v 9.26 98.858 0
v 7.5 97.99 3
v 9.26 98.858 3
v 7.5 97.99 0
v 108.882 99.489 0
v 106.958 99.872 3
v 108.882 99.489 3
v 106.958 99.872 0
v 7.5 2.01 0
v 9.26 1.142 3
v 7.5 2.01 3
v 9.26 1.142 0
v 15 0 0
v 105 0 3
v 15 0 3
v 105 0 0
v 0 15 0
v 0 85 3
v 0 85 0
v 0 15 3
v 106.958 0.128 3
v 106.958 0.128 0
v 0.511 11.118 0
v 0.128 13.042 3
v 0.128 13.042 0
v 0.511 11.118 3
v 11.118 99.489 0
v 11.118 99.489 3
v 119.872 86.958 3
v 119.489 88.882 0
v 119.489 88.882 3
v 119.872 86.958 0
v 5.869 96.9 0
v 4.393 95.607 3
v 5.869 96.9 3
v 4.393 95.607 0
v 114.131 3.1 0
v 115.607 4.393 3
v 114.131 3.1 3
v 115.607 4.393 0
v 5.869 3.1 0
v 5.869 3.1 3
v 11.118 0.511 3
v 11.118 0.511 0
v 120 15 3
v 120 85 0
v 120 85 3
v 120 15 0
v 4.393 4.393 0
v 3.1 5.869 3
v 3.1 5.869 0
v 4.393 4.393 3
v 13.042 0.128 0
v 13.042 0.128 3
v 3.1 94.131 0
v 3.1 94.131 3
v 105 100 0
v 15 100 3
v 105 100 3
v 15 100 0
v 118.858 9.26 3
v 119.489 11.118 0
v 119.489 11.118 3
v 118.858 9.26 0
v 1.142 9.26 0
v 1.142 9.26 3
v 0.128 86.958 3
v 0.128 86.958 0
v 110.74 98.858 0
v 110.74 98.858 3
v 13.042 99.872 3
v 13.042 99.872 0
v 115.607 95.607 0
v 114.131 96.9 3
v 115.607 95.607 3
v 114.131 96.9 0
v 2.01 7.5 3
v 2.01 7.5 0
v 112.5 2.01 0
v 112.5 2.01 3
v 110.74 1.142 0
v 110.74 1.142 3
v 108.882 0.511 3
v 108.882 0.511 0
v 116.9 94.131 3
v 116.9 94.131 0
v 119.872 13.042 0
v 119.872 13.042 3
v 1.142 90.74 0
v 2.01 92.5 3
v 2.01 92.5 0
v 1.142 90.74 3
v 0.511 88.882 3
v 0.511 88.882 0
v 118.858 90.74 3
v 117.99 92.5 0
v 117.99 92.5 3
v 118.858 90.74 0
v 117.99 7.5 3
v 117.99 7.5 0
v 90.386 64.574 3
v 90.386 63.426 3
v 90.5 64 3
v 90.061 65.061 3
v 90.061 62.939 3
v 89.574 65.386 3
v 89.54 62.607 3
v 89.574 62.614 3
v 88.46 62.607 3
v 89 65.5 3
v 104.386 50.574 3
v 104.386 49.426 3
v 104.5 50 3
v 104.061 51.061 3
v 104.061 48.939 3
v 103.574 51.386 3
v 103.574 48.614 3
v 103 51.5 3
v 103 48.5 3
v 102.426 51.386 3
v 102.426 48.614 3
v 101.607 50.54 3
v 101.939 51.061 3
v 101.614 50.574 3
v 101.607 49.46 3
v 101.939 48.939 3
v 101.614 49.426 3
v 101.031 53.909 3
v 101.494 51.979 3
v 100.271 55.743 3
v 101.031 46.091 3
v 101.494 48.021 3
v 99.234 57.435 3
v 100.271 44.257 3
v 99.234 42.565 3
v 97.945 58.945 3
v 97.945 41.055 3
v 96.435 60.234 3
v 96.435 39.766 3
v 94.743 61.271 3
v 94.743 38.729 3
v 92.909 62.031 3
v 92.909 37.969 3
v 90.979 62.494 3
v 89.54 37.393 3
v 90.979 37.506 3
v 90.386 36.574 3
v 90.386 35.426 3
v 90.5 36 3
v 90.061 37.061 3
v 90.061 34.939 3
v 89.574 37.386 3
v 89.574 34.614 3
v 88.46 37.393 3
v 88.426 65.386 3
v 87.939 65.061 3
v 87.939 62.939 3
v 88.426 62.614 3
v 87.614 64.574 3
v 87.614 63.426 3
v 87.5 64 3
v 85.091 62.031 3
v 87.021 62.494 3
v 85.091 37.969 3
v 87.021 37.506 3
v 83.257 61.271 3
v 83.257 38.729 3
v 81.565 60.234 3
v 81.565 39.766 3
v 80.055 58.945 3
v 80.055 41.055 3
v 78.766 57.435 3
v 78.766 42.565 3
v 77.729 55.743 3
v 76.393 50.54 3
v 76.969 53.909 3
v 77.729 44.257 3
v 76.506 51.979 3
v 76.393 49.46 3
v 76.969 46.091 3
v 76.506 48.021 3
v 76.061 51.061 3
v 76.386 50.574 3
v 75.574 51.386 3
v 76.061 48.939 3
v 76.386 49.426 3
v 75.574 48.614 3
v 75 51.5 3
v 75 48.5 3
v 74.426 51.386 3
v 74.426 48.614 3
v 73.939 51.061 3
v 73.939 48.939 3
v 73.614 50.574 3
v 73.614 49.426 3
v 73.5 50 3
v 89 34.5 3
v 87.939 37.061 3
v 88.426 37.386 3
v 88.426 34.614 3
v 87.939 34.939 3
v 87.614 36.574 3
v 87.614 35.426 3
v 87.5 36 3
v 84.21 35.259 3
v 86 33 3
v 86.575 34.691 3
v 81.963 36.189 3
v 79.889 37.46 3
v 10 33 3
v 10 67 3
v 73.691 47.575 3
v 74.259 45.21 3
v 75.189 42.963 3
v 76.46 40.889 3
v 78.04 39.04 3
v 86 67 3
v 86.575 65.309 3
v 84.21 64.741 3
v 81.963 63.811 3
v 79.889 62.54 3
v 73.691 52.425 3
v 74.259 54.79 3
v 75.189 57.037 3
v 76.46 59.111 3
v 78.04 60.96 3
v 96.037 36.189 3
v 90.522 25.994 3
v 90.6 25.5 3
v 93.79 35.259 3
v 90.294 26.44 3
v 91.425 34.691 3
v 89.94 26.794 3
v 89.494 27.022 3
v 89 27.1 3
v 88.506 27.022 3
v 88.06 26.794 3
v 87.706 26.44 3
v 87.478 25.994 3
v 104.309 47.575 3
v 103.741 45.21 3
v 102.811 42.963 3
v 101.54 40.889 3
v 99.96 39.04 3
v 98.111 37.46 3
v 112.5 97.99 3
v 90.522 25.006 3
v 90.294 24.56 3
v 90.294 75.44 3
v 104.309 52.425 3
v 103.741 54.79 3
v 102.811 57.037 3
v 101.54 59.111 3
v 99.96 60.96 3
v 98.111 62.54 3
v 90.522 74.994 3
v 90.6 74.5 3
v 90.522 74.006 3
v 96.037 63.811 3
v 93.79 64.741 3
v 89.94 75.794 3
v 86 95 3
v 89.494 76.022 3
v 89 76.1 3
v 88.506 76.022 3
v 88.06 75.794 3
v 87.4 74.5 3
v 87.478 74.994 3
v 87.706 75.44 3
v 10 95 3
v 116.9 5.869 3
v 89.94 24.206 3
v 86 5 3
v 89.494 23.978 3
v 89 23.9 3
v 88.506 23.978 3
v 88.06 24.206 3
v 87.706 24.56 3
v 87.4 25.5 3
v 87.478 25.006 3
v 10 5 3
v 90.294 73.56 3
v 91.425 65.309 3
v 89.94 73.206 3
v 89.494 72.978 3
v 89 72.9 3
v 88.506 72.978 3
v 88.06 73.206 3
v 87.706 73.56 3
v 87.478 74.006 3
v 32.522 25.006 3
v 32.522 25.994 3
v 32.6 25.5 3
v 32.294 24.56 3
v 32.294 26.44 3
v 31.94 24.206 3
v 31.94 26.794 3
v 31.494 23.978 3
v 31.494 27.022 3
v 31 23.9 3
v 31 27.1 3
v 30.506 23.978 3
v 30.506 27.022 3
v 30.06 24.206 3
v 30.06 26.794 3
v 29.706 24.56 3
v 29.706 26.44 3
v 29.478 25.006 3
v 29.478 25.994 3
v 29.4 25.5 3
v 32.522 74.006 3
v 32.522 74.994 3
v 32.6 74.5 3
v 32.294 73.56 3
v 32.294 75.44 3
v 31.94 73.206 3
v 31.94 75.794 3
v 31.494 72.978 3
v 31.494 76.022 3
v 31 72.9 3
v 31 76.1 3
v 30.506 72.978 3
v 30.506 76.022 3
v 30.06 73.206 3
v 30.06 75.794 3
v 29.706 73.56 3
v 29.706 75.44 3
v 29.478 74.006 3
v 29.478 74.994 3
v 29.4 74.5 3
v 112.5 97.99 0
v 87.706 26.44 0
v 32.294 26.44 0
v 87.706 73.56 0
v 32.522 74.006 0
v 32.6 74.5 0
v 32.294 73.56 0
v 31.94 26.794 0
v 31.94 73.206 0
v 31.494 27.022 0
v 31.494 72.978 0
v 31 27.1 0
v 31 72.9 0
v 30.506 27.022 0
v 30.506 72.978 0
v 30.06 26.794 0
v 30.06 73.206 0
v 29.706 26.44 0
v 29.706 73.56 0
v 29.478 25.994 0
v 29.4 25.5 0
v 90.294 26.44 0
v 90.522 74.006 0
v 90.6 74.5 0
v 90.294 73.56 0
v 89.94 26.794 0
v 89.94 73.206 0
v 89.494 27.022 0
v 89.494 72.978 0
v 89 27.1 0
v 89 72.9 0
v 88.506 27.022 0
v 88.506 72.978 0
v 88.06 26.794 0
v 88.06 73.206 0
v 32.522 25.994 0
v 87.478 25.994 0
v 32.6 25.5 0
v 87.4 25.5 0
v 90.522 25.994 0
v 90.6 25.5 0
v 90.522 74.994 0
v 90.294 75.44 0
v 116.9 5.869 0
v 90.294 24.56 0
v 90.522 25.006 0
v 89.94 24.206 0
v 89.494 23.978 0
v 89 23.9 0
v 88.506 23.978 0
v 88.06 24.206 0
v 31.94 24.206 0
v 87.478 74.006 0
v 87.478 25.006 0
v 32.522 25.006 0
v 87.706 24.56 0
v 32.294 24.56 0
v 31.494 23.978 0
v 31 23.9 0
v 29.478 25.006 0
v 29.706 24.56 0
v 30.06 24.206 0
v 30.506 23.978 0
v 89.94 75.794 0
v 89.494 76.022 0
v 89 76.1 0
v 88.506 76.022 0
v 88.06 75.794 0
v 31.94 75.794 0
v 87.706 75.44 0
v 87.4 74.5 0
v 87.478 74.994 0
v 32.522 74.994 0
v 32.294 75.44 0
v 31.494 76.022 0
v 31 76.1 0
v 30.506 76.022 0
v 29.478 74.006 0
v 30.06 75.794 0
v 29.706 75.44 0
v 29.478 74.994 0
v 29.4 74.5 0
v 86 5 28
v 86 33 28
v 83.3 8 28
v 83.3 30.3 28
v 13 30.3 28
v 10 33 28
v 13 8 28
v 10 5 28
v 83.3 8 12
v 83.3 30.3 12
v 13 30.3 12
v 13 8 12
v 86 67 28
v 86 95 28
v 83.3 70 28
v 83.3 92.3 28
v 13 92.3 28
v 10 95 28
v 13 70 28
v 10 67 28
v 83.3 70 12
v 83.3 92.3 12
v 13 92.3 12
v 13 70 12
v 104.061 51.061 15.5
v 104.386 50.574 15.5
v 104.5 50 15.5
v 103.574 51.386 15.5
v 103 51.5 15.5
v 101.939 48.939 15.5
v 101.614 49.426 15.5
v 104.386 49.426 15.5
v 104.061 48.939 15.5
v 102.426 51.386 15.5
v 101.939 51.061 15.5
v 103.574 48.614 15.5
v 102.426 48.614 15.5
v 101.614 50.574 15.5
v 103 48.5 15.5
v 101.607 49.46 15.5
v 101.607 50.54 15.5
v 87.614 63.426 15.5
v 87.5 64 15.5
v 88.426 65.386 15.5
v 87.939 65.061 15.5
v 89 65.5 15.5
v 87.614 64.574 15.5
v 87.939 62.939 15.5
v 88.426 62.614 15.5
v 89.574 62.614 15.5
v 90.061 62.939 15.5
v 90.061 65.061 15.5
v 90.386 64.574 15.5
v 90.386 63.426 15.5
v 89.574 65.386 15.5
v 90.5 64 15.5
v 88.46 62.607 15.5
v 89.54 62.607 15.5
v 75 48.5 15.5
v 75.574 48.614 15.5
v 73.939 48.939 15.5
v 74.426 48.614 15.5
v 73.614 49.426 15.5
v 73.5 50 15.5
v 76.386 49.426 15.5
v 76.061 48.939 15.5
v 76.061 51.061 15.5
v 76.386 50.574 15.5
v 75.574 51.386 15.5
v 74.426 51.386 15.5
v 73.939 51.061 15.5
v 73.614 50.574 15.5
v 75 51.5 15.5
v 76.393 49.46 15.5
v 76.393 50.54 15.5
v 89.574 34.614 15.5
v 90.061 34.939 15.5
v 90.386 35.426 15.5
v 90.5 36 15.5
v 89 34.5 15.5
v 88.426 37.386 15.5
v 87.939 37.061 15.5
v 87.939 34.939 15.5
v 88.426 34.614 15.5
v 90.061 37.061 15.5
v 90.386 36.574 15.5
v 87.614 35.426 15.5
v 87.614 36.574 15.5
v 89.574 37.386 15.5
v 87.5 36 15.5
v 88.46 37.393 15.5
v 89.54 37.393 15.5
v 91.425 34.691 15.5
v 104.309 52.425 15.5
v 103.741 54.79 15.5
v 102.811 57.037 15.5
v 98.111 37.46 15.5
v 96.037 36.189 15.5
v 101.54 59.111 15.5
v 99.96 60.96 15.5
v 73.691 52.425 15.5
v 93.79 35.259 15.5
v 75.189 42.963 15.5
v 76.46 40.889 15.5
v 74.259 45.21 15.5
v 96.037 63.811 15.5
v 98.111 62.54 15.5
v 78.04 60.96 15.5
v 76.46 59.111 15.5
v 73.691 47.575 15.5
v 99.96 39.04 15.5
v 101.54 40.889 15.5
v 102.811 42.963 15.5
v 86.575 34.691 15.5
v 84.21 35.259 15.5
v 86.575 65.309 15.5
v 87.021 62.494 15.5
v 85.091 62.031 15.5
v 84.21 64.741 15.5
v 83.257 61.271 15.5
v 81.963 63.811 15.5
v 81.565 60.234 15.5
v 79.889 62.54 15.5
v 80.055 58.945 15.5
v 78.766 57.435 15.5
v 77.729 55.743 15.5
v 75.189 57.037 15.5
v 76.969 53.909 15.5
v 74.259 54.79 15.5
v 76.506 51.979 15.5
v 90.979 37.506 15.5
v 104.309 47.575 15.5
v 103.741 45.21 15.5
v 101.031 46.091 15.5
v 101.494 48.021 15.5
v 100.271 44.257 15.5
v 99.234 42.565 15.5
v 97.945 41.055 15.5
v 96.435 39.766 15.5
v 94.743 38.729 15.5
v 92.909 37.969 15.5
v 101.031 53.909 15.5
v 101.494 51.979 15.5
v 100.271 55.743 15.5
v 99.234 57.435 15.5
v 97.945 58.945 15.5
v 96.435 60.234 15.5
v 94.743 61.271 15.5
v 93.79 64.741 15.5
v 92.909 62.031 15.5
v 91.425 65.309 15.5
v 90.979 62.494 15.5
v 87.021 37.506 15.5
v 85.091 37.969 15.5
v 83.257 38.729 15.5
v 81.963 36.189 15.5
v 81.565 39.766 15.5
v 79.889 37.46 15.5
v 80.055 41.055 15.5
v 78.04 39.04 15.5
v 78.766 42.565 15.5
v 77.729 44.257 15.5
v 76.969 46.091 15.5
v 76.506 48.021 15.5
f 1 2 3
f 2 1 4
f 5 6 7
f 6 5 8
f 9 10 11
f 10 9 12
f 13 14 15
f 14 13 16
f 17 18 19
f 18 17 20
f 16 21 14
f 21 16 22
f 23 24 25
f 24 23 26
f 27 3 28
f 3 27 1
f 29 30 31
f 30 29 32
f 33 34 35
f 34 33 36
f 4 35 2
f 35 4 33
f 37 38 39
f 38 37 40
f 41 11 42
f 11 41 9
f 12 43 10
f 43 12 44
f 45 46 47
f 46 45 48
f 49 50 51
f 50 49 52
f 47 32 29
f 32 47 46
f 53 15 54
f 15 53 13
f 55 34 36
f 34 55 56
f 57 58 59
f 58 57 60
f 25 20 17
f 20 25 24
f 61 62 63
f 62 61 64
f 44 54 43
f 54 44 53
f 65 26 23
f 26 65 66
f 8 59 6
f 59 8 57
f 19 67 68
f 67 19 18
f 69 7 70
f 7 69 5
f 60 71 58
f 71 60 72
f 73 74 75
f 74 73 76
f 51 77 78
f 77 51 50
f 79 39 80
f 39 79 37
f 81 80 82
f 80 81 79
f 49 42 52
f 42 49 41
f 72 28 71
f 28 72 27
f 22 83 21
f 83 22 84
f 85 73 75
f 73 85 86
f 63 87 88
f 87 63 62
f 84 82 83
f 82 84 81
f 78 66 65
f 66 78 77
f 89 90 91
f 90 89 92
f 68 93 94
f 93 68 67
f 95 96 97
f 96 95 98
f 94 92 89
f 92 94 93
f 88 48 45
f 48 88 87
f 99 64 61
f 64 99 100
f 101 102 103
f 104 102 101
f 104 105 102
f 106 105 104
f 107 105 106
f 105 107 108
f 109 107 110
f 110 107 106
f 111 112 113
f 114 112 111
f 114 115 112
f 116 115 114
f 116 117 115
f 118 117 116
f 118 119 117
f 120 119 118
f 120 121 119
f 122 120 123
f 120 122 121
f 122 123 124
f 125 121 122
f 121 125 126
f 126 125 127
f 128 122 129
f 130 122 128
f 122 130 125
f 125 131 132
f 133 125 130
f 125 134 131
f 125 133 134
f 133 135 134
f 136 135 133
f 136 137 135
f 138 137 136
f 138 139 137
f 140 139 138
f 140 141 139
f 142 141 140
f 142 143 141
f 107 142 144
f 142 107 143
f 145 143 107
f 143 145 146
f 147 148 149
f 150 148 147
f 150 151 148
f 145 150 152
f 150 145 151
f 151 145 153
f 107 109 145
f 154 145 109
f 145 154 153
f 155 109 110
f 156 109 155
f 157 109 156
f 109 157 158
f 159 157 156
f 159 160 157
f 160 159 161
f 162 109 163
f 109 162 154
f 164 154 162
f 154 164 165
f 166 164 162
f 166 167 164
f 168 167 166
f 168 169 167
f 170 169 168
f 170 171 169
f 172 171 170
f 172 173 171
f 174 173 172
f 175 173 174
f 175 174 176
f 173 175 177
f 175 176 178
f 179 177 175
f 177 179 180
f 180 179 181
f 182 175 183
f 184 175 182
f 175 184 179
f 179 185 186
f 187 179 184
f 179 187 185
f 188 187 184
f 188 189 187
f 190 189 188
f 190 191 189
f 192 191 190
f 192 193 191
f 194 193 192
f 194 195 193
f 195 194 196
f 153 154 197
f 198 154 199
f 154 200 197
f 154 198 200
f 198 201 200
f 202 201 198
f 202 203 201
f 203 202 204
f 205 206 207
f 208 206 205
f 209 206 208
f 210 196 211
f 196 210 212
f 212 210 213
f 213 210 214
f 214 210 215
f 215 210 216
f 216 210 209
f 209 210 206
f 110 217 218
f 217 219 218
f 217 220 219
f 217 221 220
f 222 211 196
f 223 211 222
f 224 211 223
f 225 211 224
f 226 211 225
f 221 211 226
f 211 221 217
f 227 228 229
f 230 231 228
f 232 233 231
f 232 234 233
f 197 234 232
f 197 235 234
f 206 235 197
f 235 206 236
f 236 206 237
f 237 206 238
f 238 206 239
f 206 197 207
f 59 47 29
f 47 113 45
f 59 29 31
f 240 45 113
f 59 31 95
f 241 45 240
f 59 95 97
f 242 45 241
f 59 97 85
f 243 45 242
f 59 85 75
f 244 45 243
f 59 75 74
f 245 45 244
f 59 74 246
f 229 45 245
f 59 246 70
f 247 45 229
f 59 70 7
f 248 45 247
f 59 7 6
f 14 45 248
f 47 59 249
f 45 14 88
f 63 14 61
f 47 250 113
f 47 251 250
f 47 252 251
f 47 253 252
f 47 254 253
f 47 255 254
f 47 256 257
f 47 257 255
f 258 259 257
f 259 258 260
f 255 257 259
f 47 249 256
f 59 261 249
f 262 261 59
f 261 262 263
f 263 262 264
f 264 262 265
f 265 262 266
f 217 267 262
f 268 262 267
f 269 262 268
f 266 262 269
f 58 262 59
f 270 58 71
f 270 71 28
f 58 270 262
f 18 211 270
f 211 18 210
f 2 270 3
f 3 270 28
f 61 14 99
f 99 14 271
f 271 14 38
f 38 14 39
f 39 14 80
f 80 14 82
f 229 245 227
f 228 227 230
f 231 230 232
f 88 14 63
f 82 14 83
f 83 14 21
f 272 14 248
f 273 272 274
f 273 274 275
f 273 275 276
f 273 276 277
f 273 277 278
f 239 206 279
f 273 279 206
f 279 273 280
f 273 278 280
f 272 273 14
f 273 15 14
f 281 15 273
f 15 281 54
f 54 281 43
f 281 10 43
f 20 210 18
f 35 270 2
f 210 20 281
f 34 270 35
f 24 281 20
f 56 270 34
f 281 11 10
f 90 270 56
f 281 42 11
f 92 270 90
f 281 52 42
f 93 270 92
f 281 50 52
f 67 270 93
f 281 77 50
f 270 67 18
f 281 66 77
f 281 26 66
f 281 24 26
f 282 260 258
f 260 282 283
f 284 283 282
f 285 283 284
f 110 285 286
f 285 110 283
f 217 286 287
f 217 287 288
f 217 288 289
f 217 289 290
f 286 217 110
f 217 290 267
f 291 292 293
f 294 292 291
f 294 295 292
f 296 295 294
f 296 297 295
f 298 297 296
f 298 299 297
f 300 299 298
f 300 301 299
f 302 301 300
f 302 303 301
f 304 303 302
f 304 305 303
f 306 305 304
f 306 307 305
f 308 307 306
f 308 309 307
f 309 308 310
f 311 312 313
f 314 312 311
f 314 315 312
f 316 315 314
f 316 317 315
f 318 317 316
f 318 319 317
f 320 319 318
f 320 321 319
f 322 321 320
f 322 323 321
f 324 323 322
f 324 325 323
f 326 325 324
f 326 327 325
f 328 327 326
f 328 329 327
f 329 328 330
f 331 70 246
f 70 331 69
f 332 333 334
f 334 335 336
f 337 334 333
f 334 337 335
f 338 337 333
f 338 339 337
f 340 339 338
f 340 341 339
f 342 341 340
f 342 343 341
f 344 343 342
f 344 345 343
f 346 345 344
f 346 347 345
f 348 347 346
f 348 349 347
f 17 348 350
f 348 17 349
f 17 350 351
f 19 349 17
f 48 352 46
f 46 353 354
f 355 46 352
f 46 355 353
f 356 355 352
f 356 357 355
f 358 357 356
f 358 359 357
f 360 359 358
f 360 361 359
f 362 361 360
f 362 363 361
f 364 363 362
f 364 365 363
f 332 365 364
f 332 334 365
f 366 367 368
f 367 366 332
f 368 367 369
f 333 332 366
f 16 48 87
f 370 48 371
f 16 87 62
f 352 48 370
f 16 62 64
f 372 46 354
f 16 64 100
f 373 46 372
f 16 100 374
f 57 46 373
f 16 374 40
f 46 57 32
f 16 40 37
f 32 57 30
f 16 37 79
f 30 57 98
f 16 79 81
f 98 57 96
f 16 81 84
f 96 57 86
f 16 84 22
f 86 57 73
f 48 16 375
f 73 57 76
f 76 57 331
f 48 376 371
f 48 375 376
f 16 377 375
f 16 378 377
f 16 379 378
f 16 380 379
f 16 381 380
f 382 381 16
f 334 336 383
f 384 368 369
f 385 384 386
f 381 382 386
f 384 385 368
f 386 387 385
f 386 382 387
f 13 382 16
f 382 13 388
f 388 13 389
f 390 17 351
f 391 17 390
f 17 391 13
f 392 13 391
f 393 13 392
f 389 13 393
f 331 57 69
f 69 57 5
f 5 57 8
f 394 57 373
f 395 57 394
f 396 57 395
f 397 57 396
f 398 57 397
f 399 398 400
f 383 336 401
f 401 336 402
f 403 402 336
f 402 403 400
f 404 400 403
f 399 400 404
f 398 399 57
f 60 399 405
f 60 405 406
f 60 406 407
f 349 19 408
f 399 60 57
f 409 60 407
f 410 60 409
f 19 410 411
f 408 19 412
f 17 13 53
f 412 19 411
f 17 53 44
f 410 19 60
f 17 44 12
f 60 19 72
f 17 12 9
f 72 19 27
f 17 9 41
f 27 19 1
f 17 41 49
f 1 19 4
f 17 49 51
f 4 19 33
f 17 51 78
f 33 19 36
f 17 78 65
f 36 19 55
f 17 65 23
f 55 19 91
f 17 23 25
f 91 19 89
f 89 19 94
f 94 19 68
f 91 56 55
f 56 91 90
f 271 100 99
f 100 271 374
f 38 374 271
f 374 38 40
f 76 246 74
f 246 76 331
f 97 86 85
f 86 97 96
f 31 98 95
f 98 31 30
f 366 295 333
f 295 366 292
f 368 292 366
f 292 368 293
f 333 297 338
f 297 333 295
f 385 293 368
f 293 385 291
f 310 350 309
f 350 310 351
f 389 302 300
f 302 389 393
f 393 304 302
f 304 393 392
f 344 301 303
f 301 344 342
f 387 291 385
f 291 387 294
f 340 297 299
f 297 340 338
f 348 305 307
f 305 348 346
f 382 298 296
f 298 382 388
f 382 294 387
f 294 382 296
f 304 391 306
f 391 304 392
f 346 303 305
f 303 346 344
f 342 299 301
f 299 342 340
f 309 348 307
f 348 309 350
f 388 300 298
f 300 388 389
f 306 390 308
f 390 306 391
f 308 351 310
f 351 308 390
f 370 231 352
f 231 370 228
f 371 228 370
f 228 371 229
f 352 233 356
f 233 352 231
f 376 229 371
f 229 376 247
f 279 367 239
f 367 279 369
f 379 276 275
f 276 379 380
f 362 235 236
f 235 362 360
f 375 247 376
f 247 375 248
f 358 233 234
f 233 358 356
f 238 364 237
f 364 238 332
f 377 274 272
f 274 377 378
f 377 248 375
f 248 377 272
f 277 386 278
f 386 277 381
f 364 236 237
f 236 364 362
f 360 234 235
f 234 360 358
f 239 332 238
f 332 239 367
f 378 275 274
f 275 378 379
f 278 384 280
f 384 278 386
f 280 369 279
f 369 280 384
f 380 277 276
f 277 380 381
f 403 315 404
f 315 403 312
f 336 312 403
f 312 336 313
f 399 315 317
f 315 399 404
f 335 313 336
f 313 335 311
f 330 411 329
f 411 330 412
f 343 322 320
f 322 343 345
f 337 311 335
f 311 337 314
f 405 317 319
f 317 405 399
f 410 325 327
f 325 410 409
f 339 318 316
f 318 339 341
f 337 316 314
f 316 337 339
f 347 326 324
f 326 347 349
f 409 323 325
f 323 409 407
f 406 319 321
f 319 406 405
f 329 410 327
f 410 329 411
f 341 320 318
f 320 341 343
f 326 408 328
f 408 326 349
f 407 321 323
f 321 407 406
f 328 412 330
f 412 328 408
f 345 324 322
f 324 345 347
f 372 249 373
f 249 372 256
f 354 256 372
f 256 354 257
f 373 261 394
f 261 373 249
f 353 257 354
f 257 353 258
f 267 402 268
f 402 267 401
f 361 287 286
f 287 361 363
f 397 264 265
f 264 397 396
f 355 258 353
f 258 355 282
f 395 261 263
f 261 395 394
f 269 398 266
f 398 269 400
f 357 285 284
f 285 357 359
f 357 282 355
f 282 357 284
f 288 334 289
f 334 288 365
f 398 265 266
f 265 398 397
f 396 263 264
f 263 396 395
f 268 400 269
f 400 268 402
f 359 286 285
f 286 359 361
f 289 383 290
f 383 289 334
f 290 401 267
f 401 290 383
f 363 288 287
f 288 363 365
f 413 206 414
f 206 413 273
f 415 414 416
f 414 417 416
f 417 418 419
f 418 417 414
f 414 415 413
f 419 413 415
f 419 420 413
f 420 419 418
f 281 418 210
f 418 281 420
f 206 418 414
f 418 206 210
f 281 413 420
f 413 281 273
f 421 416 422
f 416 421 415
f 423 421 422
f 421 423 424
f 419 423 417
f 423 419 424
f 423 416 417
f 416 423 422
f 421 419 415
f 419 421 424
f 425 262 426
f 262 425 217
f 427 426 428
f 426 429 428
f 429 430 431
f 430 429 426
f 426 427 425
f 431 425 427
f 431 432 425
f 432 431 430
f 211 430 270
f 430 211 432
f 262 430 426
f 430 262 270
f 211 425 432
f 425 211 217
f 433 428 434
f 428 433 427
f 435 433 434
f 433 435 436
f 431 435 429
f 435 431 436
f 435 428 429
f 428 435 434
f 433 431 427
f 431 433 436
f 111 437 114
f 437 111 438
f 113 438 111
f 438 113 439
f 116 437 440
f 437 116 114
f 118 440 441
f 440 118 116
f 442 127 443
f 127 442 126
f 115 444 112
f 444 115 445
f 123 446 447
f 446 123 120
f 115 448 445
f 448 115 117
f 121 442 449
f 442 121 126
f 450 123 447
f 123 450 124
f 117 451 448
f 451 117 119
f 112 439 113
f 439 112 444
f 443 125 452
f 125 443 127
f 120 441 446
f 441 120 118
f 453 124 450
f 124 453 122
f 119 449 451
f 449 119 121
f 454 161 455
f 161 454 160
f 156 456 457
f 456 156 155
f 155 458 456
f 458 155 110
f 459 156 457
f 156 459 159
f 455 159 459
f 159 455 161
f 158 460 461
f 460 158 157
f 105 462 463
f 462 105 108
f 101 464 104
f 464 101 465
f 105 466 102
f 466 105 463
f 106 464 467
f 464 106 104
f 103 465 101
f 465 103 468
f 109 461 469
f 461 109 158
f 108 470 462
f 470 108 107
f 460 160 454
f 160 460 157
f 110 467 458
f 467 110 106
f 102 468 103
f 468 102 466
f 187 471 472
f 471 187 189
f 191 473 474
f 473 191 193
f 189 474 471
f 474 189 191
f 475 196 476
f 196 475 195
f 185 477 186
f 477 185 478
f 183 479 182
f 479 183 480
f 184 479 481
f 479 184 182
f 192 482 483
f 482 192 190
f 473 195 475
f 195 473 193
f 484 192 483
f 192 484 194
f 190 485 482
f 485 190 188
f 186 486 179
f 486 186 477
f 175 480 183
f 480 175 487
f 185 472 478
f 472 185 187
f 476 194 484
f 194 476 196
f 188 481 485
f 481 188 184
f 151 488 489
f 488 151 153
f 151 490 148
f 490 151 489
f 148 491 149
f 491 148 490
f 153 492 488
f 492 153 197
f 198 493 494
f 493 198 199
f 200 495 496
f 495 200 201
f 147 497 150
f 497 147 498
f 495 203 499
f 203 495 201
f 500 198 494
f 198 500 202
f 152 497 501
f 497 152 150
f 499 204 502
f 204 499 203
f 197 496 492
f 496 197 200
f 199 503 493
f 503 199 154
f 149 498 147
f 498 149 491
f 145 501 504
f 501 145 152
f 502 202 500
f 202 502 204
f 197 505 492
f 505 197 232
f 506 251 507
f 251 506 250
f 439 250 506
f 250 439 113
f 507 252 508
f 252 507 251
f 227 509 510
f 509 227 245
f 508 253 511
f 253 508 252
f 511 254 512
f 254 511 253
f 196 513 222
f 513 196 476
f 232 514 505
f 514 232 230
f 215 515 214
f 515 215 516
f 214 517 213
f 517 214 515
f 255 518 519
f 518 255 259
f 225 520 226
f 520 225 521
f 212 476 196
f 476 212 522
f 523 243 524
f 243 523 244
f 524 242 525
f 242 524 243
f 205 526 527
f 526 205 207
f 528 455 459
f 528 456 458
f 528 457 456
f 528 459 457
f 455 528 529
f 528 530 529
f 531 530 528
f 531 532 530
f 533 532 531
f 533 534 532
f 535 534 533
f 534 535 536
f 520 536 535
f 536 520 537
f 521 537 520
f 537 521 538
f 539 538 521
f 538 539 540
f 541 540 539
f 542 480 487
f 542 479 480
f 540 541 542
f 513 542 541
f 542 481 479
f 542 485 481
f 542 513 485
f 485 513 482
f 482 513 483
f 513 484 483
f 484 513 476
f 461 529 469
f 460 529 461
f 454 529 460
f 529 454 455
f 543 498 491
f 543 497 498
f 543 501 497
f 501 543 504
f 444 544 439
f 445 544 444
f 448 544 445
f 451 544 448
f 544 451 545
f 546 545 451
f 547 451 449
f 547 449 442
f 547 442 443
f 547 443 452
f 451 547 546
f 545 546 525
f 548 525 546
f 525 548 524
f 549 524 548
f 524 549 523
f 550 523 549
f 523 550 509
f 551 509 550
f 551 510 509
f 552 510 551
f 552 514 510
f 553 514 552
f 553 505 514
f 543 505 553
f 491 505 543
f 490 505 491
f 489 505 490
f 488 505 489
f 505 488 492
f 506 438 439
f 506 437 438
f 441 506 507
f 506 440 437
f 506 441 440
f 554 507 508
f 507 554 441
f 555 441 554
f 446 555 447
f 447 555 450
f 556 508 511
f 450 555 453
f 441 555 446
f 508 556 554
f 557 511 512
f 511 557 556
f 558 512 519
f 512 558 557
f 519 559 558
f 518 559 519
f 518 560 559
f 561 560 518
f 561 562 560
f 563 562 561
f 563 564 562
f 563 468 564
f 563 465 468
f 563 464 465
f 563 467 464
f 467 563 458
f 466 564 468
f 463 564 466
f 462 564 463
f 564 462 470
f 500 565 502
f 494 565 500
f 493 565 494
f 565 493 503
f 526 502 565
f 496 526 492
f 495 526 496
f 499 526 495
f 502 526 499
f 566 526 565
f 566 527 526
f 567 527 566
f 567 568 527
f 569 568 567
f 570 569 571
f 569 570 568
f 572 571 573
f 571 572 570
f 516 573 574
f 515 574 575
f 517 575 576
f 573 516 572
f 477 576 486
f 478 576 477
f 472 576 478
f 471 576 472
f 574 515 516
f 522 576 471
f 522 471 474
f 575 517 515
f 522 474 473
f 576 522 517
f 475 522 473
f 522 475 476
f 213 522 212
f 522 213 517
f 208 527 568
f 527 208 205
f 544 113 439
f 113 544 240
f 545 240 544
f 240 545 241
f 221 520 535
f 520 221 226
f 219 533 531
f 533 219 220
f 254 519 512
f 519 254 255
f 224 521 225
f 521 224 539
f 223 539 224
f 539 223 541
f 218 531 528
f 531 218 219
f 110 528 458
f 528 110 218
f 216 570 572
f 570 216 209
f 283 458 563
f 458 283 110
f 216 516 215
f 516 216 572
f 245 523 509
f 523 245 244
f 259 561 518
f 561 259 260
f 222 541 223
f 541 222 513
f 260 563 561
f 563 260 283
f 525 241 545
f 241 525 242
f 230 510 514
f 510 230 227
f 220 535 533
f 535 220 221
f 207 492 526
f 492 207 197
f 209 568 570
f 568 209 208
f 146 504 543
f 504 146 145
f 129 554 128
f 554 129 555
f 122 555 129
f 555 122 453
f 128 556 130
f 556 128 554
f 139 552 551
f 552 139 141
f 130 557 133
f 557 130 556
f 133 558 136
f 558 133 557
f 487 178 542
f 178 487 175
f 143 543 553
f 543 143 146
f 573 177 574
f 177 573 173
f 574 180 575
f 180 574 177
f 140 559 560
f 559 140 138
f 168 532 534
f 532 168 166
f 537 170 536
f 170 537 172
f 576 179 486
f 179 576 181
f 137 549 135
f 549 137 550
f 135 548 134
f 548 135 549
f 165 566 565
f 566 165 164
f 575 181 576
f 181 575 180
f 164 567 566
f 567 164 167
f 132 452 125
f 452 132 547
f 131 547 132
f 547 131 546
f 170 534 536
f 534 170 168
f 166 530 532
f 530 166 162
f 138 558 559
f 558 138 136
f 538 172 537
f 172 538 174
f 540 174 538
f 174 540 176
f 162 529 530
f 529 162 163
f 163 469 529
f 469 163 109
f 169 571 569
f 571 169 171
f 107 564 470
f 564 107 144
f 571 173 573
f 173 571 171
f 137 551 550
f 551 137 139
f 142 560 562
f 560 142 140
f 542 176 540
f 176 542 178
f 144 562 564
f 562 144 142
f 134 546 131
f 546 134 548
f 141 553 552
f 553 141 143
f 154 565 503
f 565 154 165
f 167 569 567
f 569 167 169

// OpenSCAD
// file: params.scad
// =========================================================
// Robot Layla — Paramètres communs à toutes les pièces
// Modifiez ces valeurs selon vos composants réels avant
// d'exporter les STL (mesurez vos moteurs/écran au pied à
// coulisse si possible, les kits varient légèrement).
// =========================================================

// --- Général ---
wall = 3;              // épaisseur de paroi standard (mm)
tolerance = 0.3;       // jeu pour les pièces qui s'emboîtent (mm)

// --- Châssis / base ---
base_length = 120;     // longueur de la base (mm)
base_width  = 100;     // largeur de la base (mm)
base_height = 25;      // hauteur des parois de la base (mm)
corner_radius = 15;    // rayon des coins arrondis de la base

// --- Moteurs (kit "TT motor gearbox" standard) ---
motor_length = 70;     // longueur du moteur + boîte de vitesse (mm)
motor_width  = 22;     // largeur du moteur (mm)
motor_height = 18;     // hauteur du moteur (mm)
motor_shaft_offset = 9; // hauteur de l'axe par rapport au bas du moteur (mm)

// --- Roulette folle ---
caster_diameter = 25;  // diamètre de la roulette (mm)
caster_mount_hole = 3; // diamètre des trous de fixation (mm)

// --- Tête / écran OLED ---
head_diameter = 90;    // diamètre de la tête (mm)
head_height   = 60;    // hauteur de la tête (mm)
oled_width  = 27.3;    // largeur de la carte OLED SSD1306 0.96" (mm)
oled_height = 27.8;    // hauteur de la carte OLED (mm)
oled_screen_width  = 21.7; // zone d'affichage utile (mm)
oled_screen_height = 11.2;
oled_thickness = 4;    // épaisseur approx de la carte + connecteurs (mm)

// --- Capteur ultrason (le "nez") ---
us_width  = 45;        // largeur du HC-SR04 (mm)
us_height = 20;         // hauteur du HC-SR04 (mm)
us_eye_diameter = 16;   // diamètre des "yeux" du capteur (les 2 cylindres)
us_eye_spacing = 26;    // entraxe entre les 2 cylindres du capteur

// --- Oreilles ---
ear_base_diameter = 30; // diamètre à la base de l'oreille (mm)
ear_height = 35;        // hauteur de l'oreille (mm)
ear_spacing = 60;       // écart entre les 2 oreilles (mm)

// --- Vis M3 ---
m3_diameter = 3.2;      // diamètre de perçage pour vis M3 (passage libre)
m3_head_diameter = 6.5; // diamètre de la tête de vis M3 (pour fraisage)
// main file
// =========================================================
// Robot Layla — Base / châssis
// Plaque principale qui accueille : Raspberry Pi, driver
// moteur, pack de piles, les 2 moteurs et la roulette folle.
// =========================================================
include <params.scad>

module rounded_plate(l, w, h, r) {
    hull() {
        for (x = [r, l - r])
            for (y = [r, w - r])
                translate([x, y, 0])
                    cylinder(h = h, r = r, $fn = 48);
    }
}

module base_plate() {
    difference() {
        rounded_plate(base_length, base_width, wall, corner_radius);

        // Trous de fixation du Raspberry Pi (gabarit officiel 58x49mm,
        // trous à 3.5mm des bords, diamètre 2.75mm -> on perce 3.2mm)
        translate([base_length/2 - 29, base_width/2 - 24.5, -1])
            cylinder(h = wall + 2, d = m3_diameter, $fn = 20);
        translate([base_length/2 + 29, base_width/2 - 24.5, -1])
            cylinder(h = wall + 2, d = m3_diameter, $fn = 20);
        translate([base_length/2 - 29, base_width/2 + 24.5, -1])
            cylinder(h = wall + 2, d = m3_diameter, $fn = 20);
        translate([base_length/2 + 29, base_width/2 + 24.5, -1])
            cylinder(h = wall + 2, d = m3_diameter, $fn = 20);
    }
}

module motor_mount(x, y, mirror_x = false) {
    translate([x, y, 0]) {
        mirror([mirror_x ? 1 : 0, 0, 0]) {
            difference() {
                cube([motor_length + wall*2, motor_width + wall*2, base_height]);
                translate([wall, wall, motor_shaft_offset])
                    cube([motor_length + tolerance, motor_width + tolerance, motor_height]);
            }
        }
    }
}

module caster_mount() {
    difference() {
        cylinder(h = base_height/2, d = caster_diameter + wall*2, $fn = 40);
        translate([0, 0, -1])
            cylinder(h = base_height/2 + 2, d = caster_diameter + tolerance, $fn = 40);
        // trous de fixation de la roulette
        for (a = [0, 90, 180, 270])
            rotate([0, 0, a])
                translate([caster_diameter/2 + wall/2, 0, -1])
                    cylinder(h = base_height, d = caster_mount_hole, $fn = 16);
    }
}

// --- Assemblage ---
base_plate();

// Moteur gauche, à l'avant-gauche de la base
translate([10, 5, wall]) motor_mount(0, 0);

// Moteur droit (symétrique), à l'avant-droite
translate([10, base_width - motor_width - wall*2 - 5, wall]) motor_mount(0, 0);

// Roulette folle à l'arrière, centrée
translate([base_length - caster_diameter - wall*2, base_width/2, wall])
    caster_mount();

// NOTE: ceci est un gabarit de départ. Ajustez les positions selon
// vos moteurs réels avant impression (imprimez d'abord un essai
// rapide en "brouillon" / 15% infill pour vérifier les côtes).
